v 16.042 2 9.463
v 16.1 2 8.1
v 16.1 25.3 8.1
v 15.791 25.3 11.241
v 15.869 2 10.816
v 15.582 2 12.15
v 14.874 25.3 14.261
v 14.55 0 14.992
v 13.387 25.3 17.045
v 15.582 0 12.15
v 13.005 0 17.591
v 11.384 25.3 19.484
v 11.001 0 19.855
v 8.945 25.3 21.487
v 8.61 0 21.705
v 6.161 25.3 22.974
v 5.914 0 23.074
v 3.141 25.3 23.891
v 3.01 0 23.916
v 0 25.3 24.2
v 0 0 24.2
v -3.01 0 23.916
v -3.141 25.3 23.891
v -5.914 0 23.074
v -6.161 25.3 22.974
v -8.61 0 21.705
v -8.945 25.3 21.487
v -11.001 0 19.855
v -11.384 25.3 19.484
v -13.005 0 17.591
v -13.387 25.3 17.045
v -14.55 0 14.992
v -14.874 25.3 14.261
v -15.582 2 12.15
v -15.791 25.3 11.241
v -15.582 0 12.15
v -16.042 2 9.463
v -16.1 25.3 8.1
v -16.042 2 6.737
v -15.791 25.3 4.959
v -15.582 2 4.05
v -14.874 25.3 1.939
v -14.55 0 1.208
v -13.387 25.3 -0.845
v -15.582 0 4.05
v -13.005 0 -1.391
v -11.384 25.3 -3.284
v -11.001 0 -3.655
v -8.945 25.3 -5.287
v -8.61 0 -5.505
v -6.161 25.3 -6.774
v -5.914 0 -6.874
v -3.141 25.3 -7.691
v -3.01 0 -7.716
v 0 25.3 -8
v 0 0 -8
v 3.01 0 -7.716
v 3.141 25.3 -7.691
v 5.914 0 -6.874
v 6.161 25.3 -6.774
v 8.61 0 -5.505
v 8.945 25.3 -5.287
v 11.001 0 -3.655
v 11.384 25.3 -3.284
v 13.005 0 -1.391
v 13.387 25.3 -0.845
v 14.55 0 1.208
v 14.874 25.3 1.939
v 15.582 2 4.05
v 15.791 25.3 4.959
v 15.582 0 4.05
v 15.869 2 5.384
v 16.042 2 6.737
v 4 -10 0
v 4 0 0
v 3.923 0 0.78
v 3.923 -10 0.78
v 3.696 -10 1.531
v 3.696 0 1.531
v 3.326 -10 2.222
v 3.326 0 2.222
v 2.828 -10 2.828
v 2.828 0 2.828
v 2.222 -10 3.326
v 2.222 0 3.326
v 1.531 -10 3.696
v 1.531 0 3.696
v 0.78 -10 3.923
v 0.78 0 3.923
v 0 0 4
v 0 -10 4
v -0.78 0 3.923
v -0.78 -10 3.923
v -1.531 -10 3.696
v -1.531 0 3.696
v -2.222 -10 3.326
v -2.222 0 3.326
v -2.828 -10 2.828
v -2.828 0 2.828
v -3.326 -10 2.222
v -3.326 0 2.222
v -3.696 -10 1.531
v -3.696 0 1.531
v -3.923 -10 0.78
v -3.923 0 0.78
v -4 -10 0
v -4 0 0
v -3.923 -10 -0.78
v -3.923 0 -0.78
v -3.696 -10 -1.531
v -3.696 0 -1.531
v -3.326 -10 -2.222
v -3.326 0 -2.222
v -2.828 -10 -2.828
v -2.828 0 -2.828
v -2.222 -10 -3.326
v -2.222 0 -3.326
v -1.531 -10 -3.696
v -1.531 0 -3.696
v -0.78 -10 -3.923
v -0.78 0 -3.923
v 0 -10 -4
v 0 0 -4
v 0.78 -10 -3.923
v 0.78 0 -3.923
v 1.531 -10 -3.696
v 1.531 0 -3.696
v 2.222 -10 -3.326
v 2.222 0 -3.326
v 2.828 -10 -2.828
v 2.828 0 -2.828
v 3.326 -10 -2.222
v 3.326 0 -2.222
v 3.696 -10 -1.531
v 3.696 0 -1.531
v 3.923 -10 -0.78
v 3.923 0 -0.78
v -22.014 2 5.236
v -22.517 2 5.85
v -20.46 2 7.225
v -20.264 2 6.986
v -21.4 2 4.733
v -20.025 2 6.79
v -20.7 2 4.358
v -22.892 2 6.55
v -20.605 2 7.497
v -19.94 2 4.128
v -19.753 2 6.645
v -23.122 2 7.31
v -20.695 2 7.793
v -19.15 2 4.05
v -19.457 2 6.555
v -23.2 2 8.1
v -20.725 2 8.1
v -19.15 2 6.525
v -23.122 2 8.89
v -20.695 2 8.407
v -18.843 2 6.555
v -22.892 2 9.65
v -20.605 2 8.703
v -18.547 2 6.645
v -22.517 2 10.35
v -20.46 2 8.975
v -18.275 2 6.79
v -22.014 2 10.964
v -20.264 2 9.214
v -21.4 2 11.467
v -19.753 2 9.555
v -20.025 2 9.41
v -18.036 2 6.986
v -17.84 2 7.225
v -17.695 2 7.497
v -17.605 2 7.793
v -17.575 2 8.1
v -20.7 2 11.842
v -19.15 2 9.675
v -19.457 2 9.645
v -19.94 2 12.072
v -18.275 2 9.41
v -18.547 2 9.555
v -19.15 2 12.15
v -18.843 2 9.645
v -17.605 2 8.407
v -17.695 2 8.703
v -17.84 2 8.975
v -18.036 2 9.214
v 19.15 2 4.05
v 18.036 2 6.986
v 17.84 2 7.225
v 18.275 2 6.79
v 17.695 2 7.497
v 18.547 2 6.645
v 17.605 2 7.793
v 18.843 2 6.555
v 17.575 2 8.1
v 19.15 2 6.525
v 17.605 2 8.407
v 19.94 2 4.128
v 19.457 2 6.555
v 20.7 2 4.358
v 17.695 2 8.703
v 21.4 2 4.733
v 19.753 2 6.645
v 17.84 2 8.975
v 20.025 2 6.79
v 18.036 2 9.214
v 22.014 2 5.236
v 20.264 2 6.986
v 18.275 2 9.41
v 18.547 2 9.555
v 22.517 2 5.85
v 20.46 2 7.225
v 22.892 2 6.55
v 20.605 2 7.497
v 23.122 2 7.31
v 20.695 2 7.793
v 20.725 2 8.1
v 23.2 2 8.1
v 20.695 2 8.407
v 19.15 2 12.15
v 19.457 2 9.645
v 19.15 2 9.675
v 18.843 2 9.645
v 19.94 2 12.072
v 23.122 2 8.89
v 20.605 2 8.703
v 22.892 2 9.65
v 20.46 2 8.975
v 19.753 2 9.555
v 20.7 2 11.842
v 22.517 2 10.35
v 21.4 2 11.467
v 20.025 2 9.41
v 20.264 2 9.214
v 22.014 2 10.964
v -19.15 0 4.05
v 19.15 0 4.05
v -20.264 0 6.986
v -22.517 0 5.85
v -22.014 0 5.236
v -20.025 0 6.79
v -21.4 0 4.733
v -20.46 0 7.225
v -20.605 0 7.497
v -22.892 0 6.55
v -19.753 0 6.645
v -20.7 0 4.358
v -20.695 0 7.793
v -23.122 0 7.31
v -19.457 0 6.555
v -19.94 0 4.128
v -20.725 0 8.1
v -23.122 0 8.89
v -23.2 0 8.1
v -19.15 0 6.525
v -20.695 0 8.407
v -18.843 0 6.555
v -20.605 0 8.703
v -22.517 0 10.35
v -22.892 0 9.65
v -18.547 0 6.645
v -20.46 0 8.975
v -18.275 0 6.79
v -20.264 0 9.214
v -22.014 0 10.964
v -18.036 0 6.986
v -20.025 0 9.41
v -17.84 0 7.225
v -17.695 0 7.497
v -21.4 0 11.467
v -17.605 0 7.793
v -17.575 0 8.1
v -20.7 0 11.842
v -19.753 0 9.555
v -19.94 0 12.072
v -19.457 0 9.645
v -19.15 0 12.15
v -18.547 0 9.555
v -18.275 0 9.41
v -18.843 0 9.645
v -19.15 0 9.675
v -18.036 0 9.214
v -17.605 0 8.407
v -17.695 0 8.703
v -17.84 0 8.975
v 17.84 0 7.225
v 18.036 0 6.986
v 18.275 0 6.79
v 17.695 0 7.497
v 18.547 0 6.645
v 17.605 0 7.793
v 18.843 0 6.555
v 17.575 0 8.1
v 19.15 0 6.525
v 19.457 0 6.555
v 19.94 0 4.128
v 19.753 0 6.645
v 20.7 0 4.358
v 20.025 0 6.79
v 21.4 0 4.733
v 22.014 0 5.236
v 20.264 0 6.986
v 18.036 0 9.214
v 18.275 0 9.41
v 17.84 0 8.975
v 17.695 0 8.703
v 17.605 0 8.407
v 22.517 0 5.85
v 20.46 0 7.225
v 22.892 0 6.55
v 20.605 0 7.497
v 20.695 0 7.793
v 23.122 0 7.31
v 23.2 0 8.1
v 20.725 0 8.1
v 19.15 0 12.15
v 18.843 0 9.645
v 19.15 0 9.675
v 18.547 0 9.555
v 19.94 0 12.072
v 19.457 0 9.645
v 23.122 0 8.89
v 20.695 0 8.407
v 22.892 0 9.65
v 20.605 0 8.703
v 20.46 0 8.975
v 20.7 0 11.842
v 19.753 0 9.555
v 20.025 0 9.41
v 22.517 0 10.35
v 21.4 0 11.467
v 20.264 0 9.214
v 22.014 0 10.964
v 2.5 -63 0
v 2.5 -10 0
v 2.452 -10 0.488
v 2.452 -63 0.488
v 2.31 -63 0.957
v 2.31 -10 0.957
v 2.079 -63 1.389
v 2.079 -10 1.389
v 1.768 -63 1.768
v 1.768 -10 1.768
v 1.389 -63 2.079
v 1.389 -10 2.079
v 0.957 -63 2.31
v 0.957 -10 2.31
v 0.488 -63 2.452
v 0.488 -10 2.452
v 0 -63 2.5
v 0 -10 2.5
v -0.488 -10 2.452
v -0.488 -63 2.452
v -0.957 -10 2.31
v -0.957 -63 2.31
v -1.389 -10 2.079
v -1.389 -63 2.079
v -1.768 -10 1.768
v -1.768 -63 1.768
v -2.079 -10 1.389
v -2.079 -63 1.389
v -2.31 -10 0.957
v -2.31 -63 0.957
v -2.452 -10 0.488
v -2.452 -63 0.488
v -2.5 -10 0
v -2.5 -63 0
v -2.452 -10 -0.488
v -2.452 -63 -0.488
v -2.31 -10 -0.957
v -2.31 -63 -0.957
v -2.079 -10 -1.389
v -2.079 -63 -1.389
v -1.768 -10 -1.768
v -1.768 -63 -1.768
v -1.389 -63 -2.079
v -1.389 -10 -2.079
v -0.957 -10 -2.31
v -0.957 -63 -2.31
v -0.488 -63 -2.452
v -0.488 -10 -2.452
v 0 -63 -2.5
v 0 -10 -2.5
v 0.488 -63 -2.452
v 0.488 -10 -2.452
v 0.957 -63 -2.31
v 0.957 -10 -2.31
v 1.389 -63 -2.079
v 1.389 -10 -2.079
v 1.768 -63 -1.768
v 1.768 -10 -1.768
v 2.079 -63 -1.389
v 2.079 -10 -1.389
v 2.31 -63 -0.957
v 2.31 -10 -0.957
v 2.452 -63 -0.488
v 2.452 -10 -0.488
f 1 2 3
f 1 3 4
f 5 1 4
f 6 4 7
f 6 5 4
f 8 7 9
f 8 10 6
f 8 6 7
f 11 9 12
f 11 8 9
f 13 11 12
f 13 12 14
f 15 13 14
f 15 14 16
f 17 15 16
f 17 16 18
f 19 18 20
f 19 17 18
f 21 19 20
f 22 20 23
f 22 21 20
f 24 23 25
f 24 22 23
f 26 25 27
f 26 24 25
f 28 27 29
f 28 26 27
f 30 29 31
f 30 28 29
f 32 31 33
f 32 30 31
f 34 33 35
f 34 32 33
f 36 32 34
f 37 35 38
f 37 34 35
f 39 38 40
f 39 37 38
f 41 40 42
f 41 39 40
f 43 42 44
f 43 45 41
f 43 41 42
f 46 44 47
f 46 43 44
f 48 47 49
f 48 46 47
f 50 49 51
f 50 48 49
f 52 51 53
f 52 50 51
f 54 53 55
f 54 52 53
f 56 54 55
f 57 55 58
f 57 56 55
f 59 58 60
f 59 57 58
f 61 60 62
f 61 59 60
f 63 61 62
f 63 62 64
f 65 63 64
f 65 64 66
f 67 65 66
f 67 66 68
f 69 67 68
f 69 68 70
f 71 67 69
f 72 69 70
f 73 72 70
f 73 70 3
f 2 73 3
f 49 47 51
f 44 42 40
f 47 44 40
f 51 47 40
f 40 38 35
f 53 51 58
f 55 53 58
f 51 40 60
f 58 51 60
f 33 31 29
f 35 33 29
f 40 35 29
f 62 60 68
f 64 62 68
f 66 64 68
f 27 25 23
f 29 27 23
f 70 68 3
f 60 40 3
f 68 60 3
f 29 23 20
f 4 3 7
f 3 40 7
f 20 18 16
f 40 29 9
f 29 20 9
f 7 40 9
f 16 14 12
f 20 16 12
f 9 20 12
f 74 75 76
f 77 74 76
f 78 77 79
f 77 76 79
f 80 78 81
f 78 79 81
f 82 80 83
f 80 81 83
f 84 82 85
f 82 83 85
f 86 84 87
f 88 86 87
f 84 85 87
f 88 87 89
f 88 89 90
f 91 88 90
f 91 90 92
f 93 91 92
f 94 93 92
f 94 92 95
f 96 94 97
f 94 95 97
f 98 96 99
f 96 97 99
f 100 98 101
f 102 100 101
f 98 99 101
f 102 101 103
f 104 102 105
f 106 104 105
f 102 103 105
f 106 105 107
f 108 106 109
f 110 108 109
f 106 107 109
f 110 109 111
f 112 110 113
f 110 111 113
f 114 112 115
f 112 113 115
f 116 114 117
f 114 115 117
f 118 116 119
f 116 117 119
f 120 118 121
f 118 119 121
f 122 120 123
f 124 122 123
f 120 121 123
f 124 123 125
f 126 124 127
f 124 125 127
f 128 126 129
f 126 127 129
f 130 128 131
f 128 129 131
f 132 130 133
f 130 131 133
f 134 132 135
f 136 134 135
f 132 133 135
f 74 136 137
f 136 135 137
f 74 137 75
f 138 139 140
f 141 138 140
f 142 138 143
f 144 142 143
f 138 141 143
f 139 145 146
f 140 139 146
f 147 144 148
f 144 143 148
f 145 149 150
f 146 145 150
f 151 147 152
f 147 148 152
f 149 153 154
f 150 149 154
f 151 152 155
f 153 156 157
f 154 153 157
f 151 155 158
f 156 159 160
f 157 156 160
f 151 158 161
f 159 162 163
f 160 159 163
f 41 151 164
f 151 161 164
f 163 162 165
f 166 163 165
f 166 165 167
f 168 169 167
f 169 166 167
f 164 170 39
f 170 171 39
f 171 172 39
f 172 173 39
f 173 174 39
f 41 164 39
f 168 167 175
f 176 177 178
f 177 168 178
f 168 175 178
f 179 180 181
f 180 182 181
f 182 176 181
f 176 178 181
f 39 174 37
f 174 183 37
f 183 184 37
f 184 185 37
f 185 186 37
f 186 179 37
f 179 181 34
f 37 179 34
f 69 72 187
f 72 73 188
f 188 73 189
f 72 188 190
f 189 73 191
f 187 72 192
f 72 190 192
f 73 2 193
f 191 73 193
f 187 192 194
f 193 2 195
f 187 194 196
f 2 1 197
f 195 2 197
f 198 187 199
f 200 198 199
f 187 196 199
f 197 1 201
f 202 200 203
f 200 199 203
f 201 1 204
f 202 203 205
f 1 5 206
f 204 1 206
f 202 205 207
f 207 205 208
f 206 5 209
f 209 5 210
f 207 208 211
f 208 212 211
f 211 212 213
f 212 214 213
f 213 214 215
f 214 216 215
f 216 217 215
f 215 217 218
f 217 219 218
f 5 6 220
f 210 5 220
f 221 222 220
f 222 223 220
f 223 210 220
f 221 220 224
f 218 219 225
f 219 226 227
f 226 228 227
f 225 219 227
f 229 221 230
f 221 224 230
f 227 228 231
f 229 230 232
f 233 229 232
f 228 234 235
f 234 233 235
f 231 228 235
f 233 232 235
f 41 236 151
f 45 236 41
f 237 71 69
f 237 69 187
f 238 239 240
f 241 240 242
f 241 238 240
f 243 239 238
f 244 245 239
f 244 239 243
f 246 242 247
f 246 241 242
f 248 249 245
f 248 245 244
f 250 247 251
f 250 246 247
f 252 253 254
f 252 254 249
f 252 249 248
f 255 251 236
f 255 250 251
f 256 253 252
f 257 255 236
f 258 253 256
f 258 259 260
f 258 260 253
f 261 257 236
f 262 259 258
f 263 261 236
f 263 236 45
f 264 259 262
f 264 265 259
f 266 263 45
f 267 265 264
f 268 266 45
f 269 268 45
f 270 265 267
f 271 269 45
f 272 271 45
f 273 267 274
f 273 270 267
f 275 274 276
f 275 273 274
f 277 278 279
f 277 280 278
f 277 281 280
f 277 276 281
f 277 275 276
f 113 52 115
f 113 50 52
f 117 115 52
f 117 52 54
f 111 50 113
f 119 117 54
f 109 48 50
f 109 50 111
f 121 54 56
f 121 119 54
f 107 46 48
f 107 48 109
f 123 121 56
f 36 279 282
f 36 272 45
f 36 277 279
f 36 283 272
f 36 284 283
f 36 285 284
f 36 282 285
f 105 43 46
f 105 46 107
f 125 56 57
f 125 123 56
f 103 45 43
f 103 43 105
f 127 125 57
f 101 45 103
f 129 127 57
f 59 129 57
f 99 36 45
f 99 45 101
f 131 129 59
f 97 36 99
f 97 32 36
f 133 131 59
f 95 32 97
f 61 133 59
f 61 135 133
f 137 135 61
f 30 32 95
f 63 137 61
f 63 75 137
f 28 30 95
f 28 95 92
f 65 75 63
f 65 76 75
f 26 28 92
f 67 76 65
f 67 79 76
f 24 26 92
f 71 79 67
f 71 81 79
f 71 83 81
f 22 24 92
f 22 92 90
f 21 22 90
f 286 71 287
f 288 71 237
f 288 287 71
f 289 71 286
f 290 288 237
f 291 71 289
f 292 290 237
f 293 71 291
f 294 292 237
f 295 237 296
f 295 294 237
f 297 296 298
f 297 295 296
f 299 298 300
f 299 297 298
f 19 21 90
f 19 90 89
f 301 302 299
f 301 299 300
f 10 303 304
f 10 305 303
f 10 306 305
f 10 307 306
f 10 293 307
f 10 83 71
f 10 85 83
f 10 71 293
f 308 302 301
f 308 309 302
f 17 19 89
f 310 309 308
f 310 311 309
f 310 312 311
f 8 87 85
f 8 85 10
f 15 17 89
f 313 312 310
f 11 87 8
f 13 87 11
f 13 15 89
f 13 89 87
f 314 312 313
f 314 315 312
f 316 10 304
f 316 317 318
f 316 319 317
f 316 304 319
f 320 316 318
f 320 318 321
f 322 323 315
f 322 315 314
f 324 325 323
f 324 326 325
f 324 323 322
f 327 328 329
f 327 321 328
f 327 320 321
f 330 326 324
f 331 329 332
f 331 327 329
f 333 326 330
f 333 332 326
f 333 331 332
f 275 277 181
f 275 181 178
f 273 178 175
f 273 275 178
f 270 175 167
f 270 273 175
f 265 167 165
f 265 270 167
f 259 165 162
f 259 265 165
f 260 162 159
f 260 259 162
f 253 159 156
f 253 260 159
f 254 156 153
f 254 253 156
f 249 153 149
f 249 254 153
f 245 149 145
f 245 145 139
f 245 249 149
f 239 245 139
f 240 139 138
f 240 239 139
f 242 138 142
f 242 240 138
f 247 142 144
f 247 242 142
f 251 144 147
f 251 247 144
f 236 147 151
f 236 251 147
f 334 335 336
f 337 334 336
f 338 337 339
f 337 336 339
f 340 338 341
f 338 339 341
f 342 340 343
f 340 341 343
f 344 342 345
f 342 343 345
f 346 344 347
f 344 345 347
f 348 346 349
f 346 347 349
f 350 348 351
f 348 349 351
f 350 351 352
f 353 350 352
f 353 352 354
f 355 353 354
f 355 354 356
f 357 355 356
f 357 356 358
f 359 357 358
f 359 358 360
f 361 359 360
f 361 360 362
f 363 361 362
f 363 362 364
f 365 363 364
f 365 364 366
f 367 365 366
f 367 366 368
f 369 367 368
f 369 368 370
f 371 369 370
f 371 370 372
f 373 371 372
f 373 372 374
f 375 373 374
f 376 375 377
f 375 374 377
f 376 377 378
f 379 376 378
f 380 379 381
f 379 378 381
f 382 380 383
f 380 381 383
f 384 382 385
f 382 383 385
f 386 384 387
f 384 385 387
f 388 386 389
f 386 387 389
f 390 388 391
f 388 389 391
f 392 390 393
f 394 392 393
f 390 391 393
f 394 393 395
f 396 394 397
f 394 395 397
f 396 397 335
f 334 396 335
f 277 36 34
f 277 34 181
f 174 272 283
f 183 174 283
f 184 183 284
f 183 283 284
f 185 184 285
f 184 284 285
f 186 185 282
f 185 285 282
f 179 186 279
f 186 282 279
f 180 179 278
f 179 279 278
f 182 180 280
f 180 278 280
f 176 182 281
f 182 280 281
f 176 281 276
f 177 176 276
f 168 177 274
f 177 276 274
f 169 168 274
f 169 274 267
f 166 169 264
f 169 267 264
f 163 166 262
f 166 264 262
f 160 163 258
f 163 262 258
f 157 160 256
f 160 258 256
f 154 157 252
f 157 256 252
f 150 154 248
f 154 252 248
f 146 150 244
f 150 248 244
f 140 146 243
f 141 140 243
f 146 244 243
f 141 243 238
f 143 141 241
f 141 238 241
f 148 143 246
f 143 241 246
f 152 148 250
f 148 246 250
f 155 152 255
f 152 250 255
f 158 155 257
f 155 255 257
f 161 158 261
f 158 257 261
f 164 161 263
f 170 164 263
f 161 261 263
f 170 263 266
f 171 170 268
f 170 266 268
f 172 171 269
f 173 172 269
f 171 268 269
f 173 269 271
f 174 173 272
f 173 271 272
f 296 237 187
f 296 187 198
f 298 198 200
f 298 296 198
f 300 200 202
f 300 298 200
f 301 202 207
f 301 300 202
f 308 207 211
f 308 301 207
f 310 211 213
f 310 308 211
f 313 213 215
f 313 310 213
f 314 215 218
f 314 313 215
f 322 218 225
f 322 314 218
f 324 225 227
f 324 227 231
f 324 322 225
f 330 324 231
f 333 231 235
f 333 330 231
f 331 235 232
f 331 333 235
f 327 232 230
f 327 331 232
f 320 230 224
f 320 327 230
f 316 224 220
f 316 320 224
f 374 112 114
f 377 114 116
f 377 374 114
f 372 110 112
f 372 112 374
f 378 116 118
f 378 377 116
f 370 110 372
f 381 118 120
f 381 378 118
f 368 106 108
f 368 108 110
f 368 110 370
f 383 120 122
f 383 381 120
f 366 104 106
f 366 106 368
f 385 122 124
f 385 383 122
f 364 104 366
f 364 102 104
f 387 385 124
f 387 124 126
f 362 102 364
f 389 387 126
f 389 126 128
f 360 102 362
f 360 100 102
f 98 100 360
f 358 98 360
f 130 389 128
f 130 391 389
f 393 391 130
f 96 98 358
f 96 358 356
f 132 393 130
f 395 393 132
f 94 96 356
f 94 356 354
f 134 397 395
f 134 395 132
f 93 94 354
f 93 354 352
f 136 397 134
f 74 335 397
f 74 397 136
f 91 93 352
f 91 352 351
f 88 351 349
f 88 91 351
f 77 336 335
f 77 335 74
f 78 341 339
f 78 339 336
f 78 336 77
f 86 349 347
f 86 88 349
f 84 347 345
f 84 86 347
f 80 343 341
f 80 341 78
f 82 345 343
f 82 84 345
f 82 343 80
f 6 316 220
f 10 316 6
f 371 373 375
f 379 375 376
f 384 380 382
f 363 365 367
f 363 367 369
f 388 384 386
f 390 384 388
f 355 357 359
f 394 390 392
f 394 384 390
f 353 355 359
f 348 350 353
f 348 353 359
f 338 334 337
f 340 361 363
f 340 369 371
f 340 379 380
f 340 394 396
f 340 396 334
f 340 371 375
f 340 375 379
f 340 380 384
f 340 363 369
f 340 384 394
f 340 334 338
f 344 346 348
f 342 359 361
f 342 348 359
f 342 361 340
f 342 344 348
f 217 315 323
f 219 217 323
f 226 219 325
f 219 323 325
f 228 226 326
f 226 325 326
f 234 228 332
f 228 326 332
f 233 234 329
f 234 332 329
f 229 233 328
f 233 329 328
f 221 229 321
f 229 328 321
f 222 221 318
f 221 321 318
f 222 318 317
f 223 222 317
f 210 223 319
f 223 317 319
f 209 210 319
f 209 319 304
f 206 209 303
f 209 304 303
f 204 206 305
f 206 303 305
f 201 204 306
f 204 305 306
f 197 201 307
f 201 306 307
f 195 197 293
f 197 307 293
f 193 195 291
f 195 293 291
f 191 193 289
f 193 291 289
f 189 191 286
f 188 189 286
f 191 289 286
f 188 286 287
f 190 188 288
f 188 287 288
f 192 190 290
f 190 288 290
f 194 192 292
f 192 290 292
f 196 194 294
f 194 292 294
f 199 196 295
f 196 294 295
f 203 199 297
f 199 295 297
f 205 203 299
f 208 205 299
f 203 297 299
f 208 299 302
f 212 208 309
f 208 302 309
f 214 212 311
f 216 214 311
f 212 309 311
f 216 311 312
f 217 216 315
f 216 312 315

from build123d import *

# Parameters (mm, degrees)
F1_R     = 16.1
F2_DEPTH = 25.3
F3_R     = 1.575
F4_DEPTH = 2
F5_R     = 2.5
F6_DEPTH = 63
F7_R     = 4
F8_DEPTH = 10


with BuildPart() as f2:
    # F1 (on Front) → F2 (new body)
    with BuildSketch(Plane.XZ):
        with Locations((0, 8.1)):
            Circle(F1_R)
    extrude(amount=-F2_DEPTH)

    # F3 (on Front) → F4 (join)
    with BuildSketch(Plane.XZ):
        with BuildLine():
            ThreePointArc((-19.15, 12.15), (-23.2, 8.1), (-19.15, 4.05))
            Line((-19.15, 4.05), (-15.5822816044, 4.05))
            ThreePointArc((-15.5822816044, 4.05), (-16.1, 8.1), (-15.5822816044, 12.15))
            Line((-15.5822816044, 12.15), (-19.15, 12.15))
        make_face()
        with Locations((-19.15, 8.1)):
            Circle(F3_R, mode=Mode.SUBTRACT)
        with BuildLine():
            Line((19.15, 12.15), (15.5822816044, 12.15))
            ThreePointArc((15.5822816044, 12.15), (16.1, 8.1), (15.5822816044, 4.05))
            Line((15.5822816044, 4.05), (19.15, 4.05))
            ThreePointArc((19.15, 4.05), (23.2, 8.1), (19.15, 12.15))
        make_face()
        with Locations((19.15, 8.1)):
            Circle(F3_R, mode=Mode.SUBTRACT)
    extrude(amount=-F4_DEPTH)

    # F5 (on Front) → F6 (join)
    with BuildSketch(Plane.XZ):
        Circle(F5_R)
    extrude(amount=F6_DEPTH)

    # F7 (on face) → F8 (join)
    with BuildSketch(Plane.XZ):
        Circle(F7_R)
    extrude(amount=F8_DEPTH)


solid = f2.part
